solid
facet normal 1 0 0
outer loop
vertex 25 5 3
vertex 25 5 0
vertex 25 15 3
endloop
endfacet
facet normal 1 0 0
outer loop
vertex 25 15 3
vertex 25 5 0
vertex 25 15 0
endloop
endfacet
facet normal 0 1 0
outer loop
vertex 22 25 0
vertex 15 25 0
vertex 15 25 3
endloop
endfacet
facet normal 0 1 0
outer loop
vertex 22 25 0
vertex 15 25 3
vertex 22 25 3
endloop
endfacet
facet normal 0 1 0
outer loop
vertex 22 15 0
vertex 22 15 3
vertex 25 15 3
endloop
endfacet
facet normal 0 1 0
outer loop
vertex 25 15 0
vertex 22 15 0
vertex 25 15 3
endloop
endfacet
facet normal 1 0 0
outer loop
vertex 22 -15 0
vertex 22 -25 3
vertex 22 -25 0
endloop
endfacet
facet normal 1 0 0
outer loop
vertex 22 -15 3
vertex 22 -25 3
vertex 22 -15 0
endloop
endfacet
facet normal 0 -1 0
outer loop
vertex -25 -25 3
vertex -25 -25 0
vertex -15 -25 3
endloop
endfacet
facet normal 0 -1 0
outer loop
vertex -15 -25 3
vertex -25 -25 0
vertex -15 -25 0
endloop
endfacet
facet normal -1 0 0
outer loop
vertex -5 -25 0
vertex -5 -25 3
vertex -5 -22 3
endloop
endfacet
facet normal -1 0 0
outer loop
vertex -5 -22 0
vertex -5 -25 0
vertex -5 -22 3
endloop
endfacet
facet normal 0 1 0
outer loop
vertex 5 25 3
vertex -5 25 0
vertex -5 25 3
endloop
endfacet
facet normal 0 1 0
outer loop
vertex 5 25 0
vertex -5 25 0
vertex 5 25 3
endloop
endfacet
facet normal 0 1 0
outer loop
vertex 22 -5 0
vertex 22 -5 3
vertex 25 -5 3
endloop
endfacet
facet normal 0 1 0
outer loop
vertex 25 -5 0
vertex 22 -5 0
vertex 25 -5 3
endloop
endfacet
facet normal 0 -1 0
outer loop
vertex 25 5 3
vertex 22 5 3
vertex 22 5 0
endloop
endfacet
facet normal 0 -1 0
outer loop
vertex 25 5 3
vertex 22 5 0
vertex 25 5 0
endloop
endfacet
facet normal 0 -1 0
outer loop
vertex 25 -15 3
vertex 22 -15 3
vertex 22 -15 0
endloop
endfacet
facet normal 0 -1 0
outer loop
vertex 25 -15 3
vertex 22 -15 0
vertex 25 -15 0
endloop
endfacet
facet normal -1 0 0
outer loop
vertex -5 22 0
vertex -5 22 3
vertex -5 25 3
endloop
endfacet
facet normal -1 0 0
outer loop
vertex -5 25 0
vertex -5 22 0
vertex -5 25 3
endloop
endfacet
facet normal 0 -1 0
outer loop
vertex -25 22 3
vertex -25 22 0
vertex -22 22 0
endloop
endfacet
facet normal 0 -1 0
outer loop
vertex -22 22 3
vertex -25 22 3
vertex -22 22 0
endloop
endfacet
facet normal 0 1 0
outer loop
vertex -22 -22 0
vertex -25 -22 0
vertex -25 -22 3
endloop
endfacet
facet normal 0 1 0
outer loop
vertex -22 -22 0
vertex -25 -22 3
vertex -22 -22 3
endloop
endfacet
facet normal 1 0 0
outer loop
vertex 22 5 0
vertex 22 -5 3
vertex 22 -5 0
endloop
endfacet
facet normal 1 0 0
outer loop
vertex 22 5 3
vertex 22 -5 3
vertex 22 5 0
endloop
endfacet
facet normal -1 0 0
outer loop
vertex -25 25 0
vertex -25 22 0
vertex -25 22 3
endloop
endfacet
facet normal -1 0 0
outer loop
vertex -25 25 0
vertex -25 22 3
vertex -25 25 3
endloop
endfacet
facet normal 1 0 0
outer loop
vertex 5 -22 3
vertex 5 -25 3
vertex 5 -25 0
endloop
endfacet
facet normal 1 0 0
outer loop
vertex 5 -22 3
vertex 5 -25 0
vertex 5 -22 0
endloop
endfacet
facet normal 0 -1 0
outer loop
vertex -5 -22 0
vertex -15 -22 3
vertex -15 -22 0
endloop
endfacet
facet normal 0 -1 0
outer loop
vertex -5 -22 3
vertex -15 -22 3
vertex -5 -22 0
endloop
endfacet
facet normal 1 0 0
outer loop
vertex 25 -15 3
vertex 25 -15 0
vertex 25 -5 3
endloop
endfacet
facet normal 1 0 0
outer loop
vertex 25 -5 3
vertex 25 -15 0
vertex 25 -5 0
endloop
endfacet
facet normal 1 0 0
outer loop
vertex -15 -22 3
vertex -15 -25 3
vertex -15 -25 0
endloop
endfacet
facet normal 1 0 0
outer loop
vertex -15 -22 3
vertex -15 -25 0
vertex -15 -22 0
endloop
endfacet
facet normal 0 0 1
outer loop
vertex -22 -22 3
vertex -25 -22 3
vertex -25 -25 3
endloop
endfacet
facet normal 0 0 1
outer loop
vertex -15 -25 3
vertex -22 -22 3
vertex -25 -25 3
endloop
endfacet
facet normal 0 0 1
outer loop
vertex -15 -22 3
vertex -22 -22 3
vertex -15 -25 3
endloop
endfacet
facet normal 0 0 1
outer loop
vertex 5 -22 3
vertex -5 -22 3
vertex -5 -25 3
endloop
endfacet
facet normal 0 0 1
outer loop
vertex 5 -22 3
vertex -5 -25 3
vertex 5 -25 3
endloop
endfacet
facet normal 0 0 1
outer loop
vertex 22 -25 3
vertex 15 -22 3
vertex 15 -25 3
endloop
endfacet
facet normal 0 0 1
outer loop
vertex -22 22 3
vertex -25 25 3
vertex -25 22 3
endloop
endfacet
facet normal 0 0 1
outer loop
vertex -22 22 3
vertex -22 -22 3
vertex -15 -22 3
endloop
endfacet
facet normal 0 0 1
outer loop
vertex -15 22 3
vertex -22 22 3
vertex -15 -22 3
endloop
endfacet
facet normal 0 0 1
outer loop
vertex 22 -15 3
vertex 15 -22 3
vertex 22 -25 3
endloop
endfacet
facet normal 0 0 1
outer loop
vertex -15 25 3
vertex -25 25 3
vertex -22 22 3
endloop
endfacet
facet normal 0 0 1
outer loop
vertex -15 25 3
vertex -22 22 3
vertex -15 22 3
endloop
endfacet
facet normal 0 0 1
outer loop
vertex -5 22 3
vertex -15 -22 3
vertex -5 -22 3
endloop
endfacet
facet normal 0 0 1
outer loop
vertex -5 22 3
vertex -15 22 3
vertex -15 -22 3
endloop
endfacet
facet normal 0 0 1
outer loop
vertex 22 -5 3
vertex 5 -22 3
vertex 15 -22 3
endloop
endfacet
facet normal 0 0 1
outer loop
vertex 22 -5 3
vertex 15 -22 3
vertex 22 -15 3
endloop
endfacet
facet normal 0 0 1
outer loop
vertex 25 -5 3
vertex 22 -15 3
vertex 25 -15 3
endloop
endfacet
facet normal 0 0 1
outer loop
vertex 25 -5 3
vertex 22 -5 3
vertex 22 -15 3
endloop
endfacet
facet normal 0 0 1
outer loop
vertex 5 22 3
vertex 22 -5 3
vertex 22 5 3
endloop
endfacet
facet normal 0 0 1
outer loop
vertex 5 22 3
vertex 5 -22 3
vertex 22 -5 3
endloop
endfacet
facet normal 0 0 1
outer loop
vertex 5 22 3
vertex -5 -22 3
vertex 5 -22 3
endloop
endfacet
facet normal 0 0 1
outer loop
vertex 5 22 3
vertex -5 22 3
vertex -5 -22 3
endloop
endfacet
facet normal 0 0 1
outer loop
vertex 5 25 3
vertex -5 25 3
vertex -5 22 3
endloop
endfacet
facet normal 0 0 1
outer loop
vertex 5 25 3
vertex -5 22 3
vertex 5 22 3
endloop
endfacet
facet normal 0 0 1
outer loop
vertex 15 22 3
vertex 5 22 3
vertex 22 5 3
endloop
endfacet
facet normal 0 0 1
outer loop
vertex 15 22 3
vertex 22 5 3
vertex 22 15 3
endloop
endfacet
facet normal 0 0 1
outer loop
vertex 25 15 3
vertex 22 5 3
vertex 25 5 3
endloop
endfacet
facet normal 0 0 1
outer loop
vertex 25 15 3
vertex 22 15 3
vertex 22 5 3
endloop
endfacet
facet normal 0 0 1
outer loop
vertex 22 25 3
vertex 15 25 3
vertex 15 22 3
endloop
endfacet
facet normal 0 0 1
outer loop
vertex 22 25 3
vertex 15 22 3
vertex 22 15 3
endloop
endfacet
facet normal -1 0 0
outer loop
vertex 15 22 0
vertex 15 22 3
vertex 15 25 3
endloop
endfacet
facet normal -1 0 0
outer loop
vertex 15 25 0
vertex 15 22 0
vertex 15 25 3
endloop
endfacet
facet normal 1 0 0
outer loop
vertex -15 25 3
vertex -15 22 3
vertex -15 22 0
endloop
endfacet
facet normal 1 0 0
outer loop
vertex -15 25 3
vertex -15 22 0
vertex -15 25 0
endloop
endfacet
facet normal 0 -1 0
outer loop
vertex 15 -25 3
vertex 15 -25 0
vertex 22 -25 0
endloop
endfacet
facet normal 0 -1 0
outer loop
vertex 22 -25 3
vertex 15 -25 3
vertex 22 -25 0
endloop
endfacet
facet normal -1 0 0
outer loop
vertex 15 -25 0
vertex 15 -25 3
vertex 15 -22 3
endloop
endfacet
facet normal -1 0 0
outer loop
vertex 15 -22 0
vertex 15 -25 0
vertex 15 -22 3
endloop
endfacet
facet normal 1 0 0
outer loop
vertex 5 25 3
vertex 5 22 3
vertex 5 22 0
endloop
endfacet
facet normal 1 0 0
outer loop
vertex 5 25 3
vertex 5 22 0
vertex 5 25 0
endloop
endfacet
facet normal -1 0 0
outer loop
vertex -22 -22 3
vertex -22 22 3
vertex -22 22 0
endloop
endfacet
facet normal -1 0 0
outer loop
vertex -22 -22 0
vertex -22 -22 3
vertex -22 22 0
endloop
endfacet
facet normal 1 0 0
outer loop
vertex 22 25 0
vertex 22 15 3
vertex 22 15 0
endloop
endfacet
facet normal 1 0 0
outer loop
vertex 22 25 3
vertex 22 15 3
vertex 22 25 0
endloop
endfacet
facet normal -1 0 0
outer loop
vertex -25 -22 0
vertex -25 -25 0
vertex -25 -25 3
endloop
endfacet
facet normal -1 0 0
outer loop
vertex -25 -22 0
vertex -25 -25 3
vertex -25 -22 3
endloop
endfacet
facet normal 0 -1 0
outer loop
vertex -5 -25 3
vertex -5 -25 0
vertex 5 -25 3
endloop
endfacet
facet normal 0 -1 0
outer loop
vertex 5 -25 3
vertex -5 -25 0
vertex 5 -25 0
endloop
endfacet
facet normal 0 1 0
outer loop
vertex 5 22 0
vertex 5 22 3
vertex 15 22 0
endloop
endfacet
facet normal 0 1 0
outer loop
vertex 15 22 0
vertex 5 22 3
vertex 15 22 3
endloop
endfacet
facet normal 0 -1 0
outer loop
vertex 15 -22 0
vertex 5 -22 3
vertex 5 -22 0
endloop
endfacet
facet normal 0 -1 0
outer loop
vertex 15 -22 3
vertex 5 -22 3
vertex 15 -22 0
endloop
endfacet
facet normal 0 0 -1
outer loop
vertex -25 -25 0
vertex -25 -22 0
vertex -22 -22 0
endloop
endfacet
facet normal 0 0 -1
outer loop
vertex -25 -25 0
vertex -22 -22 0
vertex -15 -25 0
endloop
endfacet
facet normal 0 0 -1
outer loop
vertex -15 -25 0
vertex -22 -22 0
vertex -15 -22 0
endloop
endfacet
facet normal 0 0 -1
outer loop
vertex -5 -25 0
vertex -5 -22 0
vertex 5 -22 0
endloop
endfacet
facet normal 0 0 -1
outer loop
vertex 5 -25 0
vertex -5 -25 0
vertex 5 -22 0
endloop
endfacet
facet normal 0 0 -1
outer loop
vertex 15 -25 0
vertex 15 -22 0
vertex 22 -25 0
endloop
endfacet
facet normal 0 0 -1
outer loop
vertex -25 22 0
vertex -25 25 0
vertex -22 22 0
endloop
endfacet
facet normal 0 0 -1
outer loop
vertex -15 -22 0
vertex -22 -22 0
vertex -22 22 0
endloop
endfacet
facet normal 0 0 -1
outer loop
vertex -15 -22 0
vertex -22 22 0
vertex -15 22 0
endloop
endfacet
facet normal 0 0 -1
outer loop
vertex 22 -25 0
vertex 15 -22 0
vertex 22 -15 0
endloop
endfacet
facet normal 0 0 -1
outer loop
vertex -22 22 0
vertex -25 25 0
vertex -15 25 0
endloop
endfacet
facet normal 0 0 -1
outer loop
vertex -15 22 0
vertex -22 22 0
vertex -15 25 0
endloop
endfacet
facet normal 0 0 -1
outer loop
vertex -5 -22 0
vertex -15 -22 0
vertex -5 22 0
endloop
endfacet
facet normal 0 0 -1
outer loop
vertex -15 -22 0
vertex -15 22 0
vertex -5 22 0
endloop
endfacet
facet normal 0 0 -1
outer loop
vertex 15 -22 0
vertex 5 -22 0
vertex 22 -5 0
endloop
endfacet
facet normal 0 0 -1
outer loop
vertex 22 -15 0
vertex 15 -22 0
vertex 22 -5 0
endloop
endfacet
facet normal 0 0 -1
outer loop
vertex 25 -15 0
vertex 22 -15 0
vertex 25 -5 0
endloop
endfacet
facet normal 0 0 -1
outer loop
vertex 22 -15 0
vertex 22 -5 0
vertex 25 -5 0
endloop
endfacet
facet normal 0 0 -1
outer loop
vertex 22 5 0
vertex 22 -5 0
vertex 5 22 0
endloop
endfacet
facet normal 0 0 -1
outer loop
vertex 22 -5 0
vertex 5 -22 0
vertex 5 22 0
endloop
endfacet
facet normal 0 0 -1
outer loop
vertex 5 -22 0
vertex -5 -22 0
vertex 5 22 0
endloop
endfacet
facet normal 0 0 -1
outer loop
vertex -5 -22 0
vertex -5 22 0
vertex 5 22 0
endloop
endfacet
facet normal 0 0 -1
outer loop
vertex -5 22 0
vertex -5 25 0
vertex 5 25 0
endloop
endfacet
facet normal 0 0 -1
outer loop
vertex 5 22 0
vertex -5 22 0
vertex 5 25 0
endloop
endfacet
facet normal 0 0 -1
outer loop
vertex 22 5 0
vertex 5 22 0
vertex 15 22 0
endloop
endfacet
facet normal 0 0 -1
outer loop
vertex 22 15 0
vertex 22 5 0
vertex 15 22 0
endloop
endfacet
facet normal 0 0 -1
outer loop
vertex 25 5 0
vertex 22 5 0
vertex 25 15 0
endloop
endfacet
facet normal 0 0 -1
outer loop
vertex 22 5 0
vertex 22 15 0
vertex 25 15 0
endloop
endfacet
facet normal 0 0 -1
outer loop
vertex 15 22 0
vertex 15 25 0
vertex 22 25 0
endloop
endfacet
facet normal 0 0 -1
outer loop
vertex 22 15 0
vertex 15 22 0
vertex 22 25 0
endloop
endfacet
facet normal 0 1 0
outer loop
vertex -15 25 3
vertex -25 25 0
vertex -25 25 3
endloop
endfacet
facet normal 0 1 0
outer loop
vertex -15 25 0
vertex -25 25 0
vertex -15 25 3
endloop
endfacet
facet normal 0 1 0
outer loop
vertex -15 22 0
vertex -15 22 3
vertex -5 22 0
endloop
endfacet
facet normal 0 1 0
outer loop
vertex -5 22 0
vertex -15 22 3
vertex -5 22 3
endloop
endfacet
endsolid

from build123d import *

# Parameters (mm, degrees)
SKETCH1_W           = 50
SKETCH1_H           = 50
BOSS_EXTRUDE1_DEPTH = 3
SKETCH2_W           = 10
SKETCH2_H           = 3
SKETCH2_W_2         = 3
SKETCH2_H_2         = 10
CUT_EXTRUDE1_DEPTH  = 3
CAVITY1_START       = -22
CAVITY1_OUTLINE_W   = 3
CAVITY1_OUTLINE_H   = 3
CAVITY1_DEPTH       = 44


# Read off the part's stored shape, not the designer's step: Cavity1
with BuildPart() as part:
    # Sketch1 → Boss-Extrude1 (new body)
    with BuildSketch(Plane.XY):
        Rectangle(SKETCH1_W, SKETCH1_H)
    extrude(amount=BOSS_EXTRUDE1_DEPTH)

    # Sketch2 → Cut-Extrude1 (cut)
    with BuildSketch(Plane.XY.offset(3)):
        with Locations((-10, 23.5)):
            Rectangle(SKETCH2_W, SKETCH2_H)
        with Locations((10, 23.5)):
            Rectangle(SKETCH2_W, SKETCH2_H)
        with Locations((10, -23.5)):
            Rectangle(SKETCH2_W, SKETCH2_H)
        with Locations((-10, -23.5)):
            Rectangle(SKETCH2_W, SKETCH2_H)
        with Locations((23.5, 20)):
            Rectangle(SKETCH2_W_2, SKETCH2_H_2)
        with Locations((23.5, -20)):
            Rectangle(SKETCH2_W_2, SKETCH2_H_2)
        with Locations((23.5, 0)):
            Rectangle(SKETCH2_W_2, SKETCH2_H_2)
    extrude(amount=-CUT_EXTRUDE1_DEPTH, mode=Mode.SUBTRACT)

    # Cavity1 outline → Cavity1 (cut)
    with BuildSketch(Plane(origin=(0, 0, 0), x_dir=(1, 0, 0), z_dir=(0, 1, 0)).offset(CAVITY1_START)):
        with Locations((-23.5, -1.5)):
            Rectangle(CAVITY1_OUTLINE_W, CAVITY1_OUTLINE_H)
    extrude(amount=CAVITY1_DEPTH, mode=Mode.SUBTRACT)


solid = part.part
